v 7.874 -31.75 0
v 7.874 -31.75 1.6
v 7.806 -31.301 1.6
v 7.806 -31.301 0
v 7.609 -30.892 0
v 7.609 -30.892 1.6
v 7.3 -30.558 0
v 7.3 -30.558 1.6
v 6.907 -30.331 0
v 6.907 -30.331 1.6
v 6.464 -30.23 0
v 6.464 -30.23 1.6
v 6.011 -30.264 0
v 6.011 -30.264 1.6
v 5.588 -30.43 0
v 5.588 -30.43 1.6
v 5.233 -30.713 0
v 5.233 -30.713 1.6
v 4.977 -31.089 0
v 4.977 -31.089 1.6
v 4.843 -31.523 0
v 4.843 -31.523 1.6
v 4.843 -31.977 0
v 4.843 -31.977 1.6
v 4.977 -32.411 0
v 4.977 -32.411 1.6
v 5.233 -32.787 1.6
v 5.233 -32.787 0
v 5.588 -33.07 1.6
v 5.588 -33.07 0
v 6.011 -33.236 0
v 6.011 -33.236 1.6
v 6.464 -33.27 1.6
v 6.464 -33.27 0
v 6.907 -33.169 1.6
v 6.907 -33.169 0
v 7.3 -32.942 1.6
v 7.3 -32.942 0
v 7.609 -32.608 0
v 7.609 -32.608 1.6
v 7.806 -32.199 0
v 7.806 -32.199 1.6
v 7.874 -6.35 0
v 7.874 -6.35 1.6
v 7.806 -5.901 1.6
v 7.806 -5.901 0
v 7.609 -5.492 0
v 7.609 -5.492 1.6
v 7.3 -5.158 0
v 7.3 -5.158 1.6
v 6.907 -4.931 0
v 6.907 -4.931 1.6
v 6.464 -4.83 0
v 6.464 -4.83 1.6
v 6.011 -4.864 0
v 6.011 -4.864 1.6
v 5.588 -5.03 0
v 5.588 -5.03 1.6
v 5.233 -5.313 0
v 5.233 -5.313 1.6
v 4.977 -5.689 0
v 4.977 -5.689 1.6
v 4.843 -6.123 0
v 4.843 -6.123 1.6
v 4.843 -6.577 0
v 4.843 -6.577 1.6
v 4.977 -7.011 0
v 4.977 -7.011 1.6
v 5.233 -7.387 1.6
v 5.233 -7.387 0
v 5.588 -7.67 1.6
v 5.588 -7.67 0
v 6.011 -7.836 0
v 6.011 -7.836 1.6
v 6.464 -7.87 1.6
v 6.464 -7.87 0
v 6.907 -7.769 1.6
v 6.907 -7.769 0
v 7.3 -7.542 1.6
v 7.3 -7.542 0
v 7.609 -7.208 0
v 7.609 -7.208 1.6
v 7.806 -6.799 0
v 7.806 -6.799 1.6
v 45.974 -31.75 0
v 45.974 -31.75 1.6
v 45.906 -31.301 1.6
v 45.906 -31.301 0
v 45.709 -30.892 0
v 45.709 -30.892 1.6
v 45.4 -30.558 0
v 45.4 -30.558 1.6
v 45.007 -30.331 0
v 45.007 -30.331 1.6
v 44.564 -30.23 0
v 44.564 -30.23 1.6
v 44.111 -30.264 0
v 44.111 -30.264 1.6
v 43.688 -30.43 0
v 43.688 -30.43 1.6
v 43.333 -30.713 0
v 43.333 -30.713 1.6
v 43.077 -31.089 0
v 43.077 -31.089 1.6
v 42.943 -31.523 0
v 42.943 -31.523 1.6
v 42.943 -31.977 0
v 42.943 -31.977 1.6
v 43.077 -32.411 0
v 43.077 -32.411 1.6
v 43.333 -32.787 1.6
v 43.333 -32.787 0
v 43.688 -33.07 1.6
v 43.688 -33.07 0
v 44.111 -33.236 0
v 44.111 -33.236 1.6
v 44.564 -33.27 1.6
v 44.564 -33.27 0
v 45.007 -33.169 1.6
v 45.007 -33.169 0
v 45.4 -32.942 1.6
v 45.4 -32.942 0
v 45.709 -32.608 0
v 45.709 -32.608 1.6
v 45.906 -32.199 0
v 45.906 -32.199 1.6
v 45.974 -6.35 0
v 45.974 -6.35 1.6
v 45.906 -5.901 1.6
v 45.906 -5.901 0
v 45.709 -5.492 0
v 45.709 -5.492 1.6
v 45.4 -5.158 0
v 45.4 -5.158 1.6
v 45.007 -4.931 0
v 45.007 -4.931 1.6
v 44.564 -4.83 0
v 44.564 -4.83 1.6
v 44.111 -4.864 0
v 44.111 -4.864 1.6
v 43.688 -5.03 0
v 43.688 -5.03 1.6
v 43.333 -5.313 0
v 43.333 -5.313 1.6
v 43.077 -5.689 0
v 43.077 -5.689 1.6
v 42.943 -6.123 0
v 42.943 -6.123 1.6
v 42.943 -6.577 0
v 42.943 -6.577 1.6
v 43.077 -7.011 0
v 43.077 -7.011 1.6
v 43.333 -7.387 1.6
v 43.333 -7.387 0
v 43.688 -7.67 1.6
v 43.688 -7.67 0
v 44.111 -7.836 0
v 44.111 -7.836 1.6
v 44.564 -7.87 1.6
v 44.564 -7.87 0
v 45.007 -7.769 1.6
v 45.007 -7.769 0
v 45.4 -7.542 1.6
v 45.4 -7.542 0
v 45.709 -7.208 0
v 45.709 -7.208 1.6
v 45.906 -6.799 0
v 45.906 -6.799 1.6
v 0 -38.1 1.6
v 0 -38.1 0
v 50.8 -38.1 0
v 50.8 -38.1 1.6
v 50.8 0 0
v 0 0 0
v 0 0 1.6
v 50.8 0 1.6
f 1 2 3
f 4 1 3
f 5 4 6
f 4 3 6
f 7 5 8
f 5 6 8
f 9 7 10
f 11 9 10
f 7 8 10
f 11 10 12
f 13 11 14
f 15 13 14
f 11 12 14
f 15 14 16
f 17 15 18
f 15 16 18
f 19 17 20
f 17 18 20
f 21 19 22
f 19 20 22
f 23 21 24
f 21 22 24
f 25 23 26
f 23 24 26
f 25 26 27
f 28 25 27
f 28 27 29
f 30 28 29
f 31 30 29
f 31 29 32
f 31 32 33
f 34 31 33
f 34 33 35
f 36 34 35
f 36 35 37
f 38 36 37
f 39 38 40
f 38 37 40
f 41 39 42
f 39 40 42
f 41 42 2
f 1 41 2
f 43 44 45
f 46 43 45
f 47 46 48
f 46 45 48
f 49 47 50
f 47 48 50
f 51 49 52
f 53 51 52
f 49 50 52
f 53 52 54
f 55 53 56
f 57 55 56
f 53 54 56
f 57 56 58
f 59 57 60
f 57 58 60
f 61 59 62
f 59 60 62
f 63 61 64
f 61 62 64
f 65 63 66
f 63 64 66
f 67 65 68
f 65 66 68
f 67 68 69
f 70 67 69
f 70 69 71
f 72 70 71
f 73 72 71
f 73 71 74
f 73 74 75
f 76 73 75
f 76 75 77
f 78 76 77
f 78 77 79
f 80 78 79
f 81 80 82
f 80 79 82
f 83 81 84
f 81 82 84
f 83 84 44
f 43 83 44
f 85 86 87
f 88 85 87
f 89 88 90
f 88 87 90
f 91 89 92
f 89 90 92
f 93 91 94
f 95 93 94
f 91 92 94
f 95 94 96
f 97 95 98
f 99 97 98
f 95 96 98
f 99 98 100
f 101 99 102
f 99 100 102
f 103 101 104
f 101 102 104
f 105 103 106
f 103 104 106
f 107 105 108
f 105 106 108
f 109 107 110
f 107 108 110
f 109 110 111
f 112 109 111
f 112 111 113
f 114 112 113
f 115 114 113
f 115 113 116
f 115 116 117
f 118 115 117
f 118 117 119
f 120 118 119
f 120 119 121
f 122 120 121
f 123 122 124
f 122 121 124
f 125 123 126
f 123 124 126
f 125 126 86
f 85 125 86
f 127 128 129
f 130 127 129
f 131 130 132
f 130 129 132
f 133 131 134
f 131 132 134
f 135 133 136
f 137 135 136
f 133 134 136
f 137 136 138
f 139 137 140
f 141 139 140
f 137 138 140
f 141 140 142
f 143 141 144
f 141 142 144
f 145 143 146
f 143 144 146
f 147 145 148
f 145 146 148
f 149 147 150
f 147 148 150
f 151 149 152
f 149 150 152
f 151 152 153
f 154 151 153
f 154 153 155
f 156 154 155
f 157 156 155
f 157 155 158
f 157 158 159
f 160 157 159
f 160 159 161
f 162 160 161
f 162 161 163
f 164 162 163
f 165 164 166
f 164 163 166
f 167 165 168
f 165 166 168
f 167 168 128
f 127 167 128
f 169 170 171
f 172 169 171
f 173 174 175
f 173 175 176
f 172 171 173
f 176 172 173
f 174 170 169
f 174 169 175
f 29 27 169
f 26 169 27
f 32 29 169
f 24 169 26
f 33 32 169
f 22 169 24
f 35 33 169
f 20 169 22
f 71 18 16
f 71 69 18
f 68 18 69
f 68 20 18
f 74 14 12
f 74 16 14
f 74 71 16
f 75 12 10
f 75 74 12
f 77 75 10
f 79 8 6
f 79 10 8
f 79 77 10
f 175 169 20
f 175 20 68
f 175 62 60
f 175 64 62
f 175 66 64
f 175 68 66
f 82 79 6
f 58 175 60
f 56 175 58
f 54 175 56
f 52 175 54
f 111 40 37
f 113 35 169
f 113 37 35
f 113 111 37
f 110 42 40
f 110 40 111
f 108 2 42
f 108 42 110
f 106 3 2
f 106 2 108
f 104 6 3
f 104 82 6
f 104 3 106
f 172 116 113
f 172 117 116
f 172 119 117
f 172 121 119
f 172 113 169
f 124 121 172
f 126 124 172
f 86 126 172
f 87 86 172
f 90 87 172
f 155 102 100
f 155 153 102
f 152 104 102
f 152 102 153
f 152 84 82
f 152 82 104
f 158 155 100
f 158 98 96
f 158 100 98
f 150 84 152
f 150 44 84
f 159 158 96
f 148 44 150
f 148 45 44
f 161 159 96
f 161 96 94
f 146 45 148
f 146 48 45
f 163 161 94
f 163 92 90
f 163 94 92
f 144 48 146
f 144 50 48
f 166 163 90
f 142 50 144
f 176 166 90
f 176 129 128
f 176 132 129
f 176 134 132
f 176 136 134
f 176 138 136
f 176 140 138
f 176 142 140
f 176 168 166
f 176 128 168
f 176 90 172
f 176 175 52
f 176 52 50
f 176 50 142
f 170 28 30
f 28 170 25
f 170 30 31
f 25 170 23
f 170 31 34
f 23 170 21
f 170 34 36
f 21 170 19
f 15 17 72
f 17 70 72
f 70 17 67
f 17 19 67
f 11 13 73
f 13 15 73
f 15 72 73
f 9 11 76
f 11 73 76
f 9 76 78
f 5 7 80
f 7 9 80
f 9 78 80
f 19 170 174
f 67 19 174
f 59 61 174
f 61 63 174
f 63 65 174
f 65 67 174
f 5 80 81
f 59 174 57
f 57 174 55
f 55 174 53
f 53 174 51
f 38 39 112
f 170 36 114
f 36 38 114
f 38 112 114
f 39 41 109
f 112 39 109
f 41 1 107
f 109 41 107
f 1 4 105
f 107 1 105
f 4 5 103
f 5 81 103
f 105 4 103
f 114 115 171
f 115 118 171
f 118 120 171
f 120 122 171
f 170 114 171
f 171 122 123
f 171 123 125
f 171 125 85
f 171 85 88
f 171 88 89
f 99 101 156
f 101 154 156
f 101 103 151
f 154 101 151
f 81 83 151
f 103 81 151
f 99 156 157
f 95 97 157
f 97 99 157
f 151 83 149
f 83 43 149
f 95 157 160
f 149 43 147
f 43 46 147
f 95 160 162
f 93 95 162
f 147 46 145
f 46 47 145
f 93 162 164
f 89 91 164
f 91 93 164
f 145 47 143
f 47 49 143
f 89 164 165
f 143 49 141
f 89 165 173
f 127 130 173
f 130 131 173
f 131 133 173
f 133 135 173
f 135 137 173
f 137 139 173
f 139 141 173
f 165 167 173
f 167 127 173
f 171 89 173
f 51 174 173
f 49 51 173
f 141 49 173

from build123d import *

# Parameters (mm, degrees)
SKETCH1_W            = 50.8
SKETCH1_H            = 38.1
EXTRUDE1_DEPTH       = 1.6002
SKETCH2_R            = 1.524
CUT_EXTRUDE1_DEPTH   = 1.6002
LPATTERN1_COUNT      = 2
LPATTERN1_PITCH      = 38.1
LPATTERN1_COUNT_DIR2 = 2
LPATTERN1_PITCH_DIR2 = 25.4


with BuildPart() as part:
    # Sketch1 → Extrude1 (new body)
    with BuildSketch(Plane.XY):
        with Locations((25.4, -19.05)):
            Rectangle(SKETCH1_W, SKETCH1_H)
    extrude(amount=EXTRUDE1_DEPTH)

    # Sketch2 → Cut-Extrude1 (cut)
    with BuildSketch(Plane.XY.offset(1.6002)):
        with Locations((6.35, -6.35)):
            Circle(SKETCH2_R)
    cut_extrude1 = extrude(amount=-CUT_EXTRUDE1_DEPTH, mode=Mode.SUBTRACT)

    # LPattern1: Cut-Extrude1 2 × 2
    with Locations(*[(i * LPATTERN1_PITCH, -j * LPATTERN1_PITCH_DIR2, 0) for i in range(LPATTERN1_COUNT) for j in range(LPATTERN1_COUNT_DIR2) if (i, j) != (0, 0)]):
        add(cut_extrude1, mode=Mode.SUBTRACT)


solid = part.part
